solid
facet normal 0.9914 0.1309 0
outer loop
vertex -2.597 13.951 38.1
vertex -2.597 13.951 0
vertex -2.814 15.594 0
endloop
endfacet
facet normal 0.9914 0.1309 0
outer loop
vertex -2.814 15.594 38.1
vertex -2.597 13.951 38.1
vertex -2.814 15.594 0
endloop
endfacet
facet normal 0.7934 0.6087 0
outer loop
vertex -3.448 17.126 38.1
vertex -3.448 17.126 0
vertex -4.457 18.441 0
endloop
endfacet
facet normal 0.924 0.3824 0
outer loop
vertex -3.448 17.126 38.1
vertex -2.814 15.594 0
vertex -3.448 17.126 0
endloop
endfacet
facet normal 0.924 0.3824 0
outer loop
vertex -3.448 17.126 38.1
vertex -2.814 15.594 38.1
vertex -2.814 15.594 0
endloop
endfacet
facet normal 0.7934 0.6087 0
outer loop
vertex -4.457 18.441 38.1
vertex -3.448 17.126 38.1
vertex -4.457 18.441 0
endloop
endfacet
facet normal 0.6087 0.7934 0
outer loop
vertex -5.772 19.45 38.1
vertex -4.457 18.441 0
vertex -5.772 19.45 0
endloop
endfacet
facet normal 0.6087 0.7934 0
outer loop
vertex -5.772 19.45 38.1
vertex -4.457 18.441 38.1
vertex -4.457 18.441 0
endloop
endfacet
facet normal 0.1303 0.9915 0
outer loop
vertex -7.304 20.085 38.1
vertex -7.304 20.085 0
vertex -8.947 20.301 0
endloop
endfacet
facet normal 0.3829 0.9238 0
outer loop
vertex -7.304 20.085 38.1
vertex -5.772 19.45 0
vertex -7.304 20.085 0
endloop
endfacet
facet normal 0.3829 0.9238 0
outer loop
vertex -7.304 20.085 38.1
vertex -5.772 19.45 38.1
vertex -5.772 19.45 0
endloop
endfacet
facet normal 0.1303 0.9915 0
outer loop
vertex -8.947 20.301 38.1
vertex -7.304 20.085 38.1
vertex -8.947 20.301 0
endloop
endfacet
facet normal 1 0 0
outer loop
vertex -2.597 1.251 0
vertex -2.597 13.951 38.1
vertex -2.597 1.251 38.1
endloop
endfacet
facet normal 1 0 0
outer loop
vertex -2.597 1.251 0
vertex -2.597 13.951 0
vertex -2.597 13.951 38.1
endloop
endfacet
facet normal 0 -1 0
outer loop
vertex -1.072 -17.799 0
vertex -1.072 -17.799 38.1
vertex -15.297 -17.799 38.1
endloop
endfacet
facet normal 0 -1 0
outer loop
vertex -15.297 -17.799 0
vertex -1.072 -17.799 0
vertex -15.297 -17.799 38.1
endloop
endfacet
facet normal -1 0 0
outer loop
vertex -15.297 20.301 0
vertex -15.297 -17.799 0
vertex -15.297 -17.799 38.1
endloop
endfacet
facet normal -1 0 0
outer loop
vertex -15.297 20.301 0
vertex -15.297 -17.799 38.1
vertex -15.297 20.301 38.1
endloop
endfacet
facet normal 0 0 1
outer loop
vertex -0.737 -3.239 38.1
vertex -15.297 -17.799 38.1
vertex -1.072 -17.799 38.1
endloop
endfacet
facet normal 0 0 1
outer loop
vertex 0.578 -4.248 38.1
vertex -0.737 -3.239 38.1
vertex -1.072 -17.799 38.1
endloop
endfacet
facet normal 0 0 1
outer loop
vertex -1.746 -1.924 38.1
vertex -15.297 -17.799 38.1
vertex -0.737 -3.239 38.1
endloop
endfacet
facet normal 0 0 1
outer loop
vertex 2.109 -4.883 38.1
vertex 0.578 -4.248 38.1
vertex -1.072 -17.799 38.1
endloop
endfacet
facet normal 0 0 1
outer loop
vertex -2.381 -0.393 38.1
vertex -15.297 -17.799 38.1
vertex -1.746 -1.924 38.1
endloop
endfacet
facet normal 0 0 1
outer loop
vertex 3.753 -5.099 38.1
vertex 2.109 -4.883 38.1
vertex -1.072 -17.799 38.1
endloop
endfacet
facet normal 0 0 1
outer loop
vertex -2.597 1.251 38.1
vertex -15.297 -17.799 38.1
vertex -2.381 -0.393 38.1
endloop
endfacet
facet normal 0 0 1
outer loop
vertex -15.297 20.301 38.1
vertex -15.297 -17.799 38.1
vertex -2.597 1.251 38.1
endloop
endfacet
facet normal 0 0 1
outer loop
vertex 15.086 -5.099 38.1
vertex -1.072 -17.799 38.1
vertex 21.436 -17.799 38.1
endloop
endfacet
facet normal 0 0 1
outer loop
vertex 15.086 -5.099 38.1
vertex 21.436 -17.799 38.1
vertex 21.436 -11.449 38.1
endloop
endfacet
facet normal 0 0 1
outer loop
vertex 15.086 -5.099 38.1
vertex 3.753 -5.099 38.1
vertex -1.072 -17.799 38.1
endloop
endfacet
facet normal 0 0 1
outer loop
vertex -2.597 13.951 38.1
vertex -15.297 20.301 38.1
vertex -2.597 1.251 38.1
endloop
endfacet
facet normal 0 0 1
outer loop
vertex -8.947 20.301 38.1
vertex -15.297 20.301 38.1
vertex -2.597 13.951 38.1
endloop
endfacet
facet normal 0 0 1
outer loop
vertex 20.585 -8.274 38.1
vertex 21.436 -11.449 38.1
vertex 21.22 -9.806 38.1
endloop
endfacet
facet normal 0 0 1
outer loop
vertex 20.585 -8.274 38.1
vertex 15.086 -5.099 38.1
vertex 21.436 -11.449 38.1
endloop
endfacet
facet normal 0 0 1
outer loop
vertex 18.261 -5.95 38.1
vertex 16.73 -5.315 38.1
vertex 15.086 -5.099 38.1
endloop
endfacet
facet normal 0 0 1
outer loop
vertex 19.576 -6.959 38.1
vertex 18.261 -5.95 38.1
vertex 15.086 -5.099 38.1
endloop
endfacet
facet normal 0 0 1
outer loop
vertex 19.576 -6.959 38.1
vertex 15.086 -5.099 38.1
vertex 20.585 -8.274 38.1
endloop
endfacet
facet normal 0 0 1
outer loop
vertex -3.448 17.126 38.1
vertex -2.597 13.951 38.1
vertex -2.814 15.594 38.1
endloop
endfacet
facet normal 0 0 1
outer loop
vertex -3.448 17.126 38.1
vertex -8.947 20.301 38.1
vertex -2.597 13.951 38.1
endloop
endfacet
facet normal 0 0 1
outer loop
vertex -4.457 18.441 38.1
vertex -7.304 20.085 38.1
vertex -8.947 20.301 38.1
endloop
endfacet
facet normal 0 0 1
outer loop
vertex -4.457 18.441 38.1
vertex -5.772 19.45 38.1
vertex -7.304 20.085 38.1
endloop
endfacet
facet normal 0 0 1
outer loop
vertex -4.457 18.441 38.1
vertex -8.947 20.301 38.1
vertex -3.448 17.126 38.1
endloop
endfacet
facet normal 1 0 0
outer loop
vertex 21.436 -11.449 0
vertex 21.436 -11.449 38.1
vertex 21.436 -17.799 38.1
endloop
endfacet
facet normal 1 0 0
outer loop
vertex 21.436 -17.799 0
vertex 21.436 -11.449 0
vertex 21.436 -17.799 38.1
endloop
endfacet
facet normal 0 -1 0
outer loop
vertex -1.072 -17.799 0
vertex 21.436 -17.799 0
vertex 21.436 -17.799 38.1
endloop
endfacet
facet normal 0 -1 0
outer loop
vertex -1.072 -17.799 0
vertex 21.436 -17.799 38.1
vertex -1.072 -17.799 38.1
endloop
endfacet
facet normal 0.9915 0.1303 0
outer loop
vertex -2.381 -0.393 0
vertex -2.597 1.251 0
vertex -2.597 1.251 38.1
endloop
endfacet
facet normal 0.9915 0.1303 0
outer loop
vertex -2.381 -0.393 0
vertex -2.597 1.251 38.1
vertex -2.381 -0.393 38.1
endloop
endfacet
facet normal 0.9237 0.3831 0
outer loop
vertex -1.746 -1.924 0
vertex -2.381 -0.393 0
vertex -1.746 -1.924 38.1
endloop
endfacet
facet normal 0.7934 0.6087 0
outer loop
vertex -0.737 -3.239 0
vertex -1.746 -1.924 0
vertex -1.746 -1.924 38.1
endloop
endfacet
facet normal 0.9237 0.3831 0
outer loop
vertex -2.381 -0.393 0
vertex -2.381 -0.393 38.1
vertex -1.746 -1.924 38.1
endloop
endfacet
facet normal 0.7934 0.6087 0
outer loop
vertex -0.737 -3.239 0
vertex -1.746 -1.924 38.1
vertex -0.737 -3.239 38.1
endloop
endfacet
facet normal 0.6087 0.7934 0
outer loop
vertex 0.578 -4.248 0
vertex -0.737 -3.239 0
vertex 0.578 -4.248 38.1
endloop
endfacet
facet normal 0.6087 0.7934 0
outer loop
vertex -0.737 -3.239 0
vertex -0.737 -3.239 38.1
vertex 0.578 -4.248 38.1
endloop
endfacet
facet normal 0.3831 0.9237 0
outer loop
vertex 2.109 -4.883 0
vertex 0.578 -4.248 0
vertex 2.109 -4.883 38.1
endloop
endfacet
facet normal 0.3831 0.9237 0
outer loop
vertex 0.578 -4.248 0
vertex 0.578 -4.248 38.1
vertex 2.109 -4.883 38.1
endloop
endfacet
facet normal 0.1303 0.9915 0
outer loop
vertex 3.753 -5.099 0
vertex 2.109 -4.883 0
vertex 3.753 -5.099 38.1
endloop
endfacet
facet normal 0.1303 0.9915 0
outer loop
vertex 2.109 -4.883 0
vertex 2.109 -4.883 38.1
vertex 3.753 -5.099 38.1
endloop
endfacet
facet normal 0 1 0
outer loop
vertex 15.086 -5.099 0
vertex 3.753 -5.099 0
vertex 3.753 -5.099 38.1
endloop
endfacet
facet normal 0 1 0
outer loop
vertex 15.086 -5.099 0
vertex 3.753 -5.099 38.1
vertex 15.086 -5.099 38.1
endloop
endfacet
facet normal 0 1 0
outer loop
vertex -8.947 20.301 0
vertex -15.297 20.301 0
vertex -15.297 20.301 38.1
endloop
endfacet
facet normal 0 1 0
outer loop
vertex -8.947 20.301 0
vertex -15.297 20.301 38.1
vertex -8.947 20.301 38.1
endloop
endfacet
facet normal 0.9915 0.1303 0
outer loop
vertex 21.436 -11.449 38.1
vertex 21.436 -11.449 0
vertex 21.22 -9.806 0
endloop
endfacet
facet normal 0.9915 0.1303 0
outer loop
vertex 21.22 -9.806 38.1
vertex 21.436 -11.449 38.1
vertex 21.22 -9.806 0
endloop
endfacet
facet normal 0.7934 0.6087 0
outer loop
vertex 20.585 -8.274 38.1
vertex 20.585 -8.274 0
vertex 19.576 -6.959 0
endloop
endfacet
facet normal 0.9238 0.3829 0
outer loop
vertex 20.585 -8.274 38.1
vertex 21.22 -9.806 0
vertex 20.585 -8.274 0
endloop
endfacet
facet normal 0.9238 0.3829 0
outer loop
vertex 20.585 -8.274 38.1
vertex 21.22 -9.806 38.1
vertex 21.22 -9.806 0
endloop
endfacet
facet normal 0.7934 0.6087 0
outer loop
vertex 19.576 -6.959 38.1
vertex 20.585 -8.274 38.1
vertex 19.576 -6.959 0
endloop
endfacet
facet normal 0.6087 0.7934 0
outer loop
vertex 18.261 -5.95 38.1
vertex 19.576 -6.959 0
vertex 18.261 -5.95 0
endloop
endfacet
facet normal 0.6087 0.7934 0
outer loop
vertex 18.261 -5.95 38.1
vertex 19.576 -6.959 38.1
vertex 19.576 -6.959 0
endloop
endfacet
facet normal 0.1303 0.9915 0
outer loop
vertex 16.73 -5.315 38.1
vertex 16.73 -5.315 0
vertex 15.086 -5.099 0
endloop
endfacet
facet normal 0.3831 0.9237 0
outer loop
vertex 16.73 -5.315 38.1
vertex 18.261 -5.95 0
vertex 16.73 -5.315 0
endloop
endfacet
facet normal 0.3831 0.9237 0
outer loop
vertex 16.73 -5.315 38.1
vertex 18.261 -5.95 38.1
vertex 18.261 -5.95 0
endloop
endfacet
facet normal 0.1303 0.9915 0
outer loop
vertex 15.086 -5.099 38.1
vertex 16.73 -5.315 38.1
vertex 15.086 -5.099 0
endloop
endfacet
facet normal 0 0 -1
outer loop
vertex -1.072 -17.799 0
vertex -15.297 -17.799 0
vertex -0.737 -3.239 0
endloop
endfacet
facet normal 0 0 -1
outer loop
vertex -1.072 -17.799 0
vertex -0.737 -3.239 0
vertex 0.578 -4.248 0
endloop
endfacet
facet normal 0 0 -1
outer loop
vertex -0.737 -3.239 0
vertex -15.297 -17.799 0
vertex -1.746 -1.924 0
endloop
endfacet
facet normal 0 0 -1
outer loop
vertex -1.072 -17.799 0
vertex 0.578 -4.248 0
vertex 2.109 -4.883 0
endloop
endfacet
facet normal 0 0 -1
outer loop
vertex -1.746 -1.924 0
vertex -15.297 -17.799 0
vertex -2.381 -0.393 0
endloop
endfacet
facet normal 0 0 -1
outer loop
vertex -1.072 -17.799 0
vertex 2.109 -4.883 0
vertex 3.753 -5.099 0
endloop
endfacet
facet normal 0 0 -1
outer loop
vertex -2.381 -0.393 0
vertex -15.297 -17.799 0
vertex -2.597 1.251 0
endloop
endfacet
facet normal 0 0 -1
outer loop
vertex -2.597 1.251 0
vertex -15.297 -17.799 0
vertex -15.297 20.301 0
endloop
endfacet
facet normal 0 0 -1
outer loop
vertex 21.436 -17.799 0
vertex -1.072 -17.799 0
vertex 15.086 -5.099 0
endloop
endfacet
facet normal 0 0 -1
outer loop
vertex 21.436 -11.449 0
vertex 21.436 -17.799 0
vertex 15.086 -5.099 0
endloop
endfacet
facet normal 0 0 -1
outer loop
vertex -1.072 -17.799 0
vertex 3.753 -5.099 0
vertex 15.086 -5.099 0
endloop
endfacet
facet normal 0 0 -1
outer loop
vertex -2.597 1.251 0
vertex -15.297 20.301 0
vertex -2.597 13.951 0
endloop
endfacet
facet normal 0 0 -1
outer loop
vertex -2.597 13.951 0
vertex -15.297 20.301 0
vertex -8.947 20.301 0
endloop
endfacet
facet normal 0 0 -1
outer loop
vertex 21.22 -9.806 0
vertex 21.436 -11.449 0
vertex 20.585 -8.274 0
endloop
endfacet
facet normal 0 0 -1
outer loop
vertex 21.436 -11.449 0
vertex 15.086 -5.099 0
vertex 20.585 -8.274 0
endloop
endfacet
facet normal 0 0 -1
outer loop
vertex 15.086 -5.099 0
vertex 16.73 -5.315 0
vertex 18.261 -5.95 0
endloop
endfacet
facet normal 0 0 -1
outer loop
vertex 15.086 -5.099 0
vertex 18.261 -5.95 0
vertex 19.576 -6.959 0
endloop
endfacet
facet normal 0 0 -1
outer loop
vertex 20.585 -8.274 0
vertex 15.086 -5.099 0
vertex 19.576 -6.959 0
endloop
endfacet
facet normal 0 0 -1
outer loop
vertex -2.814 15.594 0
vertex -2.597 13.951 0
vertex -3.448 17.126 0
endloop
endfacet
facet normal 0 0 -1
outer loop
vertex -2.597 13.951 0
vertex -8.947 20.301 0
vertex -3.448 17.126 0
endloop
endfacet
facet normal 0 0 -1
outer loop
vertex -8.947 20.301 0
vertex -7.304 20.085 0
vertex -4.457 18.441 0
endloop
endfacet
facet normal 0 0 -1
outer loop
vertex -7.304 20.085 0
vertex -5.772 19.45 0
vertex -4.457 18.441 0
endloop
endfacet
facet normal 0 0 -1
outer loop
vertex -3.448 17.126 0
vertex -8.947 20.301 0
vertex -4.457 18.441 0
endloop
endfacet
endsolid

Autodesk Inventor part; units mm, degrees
ref_plane "YZ Plane" through (0, 0, 0) normal (1, 0, 0) x (0, 1, 0)
ref_plane "XZ Plane" through (0, 0, 0) normal (0, 1, 0) x (-1, 0, 0)
ref_plane "XY Plane" through (0, 0, 0) normal (0, 0, 1) x (1, 0, 0)
sketch "Sketch1" plane through (0, 0, 0) normal (0, 0, 1) x (1, 0, 0)
  line L0 (-15.2972, 20.3009) -> (-2.5972, 20.3009)
  line L1 (-2.5972, 20.3009) -> (-2.5972, -5.0991)
  line L2 (-1.0722, -17.7991) -> (-15.2972, -17.7991)
  line L3 (-15.2972, -17.7991) -> (-15.2972, 20.3009)
  line L4 (-2.5972, -5.0991) -> (21.4362, -5.0991)
  line L5 (21.4362, -5.0991) -> (21.4362, -17.7991)
  line L6 (21.4362, -17.7991) -> (-1.0722, -17.7991)
  point P0 (0, 0)
  dimension "d0" = 38.1
  dimension "d1" = 12.7
  dimension "d2" = 25.4
extrude "Extrusion1" add sketch "Sketch1" along normal blind 38.1
fillet "Fillet3" radius 6.35 3 edges at (-2.5972, 20.3009, 19.05) (-2.5972, -5.0991, 19.05) (21.4362, -5.0991, 19.05)
properties part number "FilletAngle"
